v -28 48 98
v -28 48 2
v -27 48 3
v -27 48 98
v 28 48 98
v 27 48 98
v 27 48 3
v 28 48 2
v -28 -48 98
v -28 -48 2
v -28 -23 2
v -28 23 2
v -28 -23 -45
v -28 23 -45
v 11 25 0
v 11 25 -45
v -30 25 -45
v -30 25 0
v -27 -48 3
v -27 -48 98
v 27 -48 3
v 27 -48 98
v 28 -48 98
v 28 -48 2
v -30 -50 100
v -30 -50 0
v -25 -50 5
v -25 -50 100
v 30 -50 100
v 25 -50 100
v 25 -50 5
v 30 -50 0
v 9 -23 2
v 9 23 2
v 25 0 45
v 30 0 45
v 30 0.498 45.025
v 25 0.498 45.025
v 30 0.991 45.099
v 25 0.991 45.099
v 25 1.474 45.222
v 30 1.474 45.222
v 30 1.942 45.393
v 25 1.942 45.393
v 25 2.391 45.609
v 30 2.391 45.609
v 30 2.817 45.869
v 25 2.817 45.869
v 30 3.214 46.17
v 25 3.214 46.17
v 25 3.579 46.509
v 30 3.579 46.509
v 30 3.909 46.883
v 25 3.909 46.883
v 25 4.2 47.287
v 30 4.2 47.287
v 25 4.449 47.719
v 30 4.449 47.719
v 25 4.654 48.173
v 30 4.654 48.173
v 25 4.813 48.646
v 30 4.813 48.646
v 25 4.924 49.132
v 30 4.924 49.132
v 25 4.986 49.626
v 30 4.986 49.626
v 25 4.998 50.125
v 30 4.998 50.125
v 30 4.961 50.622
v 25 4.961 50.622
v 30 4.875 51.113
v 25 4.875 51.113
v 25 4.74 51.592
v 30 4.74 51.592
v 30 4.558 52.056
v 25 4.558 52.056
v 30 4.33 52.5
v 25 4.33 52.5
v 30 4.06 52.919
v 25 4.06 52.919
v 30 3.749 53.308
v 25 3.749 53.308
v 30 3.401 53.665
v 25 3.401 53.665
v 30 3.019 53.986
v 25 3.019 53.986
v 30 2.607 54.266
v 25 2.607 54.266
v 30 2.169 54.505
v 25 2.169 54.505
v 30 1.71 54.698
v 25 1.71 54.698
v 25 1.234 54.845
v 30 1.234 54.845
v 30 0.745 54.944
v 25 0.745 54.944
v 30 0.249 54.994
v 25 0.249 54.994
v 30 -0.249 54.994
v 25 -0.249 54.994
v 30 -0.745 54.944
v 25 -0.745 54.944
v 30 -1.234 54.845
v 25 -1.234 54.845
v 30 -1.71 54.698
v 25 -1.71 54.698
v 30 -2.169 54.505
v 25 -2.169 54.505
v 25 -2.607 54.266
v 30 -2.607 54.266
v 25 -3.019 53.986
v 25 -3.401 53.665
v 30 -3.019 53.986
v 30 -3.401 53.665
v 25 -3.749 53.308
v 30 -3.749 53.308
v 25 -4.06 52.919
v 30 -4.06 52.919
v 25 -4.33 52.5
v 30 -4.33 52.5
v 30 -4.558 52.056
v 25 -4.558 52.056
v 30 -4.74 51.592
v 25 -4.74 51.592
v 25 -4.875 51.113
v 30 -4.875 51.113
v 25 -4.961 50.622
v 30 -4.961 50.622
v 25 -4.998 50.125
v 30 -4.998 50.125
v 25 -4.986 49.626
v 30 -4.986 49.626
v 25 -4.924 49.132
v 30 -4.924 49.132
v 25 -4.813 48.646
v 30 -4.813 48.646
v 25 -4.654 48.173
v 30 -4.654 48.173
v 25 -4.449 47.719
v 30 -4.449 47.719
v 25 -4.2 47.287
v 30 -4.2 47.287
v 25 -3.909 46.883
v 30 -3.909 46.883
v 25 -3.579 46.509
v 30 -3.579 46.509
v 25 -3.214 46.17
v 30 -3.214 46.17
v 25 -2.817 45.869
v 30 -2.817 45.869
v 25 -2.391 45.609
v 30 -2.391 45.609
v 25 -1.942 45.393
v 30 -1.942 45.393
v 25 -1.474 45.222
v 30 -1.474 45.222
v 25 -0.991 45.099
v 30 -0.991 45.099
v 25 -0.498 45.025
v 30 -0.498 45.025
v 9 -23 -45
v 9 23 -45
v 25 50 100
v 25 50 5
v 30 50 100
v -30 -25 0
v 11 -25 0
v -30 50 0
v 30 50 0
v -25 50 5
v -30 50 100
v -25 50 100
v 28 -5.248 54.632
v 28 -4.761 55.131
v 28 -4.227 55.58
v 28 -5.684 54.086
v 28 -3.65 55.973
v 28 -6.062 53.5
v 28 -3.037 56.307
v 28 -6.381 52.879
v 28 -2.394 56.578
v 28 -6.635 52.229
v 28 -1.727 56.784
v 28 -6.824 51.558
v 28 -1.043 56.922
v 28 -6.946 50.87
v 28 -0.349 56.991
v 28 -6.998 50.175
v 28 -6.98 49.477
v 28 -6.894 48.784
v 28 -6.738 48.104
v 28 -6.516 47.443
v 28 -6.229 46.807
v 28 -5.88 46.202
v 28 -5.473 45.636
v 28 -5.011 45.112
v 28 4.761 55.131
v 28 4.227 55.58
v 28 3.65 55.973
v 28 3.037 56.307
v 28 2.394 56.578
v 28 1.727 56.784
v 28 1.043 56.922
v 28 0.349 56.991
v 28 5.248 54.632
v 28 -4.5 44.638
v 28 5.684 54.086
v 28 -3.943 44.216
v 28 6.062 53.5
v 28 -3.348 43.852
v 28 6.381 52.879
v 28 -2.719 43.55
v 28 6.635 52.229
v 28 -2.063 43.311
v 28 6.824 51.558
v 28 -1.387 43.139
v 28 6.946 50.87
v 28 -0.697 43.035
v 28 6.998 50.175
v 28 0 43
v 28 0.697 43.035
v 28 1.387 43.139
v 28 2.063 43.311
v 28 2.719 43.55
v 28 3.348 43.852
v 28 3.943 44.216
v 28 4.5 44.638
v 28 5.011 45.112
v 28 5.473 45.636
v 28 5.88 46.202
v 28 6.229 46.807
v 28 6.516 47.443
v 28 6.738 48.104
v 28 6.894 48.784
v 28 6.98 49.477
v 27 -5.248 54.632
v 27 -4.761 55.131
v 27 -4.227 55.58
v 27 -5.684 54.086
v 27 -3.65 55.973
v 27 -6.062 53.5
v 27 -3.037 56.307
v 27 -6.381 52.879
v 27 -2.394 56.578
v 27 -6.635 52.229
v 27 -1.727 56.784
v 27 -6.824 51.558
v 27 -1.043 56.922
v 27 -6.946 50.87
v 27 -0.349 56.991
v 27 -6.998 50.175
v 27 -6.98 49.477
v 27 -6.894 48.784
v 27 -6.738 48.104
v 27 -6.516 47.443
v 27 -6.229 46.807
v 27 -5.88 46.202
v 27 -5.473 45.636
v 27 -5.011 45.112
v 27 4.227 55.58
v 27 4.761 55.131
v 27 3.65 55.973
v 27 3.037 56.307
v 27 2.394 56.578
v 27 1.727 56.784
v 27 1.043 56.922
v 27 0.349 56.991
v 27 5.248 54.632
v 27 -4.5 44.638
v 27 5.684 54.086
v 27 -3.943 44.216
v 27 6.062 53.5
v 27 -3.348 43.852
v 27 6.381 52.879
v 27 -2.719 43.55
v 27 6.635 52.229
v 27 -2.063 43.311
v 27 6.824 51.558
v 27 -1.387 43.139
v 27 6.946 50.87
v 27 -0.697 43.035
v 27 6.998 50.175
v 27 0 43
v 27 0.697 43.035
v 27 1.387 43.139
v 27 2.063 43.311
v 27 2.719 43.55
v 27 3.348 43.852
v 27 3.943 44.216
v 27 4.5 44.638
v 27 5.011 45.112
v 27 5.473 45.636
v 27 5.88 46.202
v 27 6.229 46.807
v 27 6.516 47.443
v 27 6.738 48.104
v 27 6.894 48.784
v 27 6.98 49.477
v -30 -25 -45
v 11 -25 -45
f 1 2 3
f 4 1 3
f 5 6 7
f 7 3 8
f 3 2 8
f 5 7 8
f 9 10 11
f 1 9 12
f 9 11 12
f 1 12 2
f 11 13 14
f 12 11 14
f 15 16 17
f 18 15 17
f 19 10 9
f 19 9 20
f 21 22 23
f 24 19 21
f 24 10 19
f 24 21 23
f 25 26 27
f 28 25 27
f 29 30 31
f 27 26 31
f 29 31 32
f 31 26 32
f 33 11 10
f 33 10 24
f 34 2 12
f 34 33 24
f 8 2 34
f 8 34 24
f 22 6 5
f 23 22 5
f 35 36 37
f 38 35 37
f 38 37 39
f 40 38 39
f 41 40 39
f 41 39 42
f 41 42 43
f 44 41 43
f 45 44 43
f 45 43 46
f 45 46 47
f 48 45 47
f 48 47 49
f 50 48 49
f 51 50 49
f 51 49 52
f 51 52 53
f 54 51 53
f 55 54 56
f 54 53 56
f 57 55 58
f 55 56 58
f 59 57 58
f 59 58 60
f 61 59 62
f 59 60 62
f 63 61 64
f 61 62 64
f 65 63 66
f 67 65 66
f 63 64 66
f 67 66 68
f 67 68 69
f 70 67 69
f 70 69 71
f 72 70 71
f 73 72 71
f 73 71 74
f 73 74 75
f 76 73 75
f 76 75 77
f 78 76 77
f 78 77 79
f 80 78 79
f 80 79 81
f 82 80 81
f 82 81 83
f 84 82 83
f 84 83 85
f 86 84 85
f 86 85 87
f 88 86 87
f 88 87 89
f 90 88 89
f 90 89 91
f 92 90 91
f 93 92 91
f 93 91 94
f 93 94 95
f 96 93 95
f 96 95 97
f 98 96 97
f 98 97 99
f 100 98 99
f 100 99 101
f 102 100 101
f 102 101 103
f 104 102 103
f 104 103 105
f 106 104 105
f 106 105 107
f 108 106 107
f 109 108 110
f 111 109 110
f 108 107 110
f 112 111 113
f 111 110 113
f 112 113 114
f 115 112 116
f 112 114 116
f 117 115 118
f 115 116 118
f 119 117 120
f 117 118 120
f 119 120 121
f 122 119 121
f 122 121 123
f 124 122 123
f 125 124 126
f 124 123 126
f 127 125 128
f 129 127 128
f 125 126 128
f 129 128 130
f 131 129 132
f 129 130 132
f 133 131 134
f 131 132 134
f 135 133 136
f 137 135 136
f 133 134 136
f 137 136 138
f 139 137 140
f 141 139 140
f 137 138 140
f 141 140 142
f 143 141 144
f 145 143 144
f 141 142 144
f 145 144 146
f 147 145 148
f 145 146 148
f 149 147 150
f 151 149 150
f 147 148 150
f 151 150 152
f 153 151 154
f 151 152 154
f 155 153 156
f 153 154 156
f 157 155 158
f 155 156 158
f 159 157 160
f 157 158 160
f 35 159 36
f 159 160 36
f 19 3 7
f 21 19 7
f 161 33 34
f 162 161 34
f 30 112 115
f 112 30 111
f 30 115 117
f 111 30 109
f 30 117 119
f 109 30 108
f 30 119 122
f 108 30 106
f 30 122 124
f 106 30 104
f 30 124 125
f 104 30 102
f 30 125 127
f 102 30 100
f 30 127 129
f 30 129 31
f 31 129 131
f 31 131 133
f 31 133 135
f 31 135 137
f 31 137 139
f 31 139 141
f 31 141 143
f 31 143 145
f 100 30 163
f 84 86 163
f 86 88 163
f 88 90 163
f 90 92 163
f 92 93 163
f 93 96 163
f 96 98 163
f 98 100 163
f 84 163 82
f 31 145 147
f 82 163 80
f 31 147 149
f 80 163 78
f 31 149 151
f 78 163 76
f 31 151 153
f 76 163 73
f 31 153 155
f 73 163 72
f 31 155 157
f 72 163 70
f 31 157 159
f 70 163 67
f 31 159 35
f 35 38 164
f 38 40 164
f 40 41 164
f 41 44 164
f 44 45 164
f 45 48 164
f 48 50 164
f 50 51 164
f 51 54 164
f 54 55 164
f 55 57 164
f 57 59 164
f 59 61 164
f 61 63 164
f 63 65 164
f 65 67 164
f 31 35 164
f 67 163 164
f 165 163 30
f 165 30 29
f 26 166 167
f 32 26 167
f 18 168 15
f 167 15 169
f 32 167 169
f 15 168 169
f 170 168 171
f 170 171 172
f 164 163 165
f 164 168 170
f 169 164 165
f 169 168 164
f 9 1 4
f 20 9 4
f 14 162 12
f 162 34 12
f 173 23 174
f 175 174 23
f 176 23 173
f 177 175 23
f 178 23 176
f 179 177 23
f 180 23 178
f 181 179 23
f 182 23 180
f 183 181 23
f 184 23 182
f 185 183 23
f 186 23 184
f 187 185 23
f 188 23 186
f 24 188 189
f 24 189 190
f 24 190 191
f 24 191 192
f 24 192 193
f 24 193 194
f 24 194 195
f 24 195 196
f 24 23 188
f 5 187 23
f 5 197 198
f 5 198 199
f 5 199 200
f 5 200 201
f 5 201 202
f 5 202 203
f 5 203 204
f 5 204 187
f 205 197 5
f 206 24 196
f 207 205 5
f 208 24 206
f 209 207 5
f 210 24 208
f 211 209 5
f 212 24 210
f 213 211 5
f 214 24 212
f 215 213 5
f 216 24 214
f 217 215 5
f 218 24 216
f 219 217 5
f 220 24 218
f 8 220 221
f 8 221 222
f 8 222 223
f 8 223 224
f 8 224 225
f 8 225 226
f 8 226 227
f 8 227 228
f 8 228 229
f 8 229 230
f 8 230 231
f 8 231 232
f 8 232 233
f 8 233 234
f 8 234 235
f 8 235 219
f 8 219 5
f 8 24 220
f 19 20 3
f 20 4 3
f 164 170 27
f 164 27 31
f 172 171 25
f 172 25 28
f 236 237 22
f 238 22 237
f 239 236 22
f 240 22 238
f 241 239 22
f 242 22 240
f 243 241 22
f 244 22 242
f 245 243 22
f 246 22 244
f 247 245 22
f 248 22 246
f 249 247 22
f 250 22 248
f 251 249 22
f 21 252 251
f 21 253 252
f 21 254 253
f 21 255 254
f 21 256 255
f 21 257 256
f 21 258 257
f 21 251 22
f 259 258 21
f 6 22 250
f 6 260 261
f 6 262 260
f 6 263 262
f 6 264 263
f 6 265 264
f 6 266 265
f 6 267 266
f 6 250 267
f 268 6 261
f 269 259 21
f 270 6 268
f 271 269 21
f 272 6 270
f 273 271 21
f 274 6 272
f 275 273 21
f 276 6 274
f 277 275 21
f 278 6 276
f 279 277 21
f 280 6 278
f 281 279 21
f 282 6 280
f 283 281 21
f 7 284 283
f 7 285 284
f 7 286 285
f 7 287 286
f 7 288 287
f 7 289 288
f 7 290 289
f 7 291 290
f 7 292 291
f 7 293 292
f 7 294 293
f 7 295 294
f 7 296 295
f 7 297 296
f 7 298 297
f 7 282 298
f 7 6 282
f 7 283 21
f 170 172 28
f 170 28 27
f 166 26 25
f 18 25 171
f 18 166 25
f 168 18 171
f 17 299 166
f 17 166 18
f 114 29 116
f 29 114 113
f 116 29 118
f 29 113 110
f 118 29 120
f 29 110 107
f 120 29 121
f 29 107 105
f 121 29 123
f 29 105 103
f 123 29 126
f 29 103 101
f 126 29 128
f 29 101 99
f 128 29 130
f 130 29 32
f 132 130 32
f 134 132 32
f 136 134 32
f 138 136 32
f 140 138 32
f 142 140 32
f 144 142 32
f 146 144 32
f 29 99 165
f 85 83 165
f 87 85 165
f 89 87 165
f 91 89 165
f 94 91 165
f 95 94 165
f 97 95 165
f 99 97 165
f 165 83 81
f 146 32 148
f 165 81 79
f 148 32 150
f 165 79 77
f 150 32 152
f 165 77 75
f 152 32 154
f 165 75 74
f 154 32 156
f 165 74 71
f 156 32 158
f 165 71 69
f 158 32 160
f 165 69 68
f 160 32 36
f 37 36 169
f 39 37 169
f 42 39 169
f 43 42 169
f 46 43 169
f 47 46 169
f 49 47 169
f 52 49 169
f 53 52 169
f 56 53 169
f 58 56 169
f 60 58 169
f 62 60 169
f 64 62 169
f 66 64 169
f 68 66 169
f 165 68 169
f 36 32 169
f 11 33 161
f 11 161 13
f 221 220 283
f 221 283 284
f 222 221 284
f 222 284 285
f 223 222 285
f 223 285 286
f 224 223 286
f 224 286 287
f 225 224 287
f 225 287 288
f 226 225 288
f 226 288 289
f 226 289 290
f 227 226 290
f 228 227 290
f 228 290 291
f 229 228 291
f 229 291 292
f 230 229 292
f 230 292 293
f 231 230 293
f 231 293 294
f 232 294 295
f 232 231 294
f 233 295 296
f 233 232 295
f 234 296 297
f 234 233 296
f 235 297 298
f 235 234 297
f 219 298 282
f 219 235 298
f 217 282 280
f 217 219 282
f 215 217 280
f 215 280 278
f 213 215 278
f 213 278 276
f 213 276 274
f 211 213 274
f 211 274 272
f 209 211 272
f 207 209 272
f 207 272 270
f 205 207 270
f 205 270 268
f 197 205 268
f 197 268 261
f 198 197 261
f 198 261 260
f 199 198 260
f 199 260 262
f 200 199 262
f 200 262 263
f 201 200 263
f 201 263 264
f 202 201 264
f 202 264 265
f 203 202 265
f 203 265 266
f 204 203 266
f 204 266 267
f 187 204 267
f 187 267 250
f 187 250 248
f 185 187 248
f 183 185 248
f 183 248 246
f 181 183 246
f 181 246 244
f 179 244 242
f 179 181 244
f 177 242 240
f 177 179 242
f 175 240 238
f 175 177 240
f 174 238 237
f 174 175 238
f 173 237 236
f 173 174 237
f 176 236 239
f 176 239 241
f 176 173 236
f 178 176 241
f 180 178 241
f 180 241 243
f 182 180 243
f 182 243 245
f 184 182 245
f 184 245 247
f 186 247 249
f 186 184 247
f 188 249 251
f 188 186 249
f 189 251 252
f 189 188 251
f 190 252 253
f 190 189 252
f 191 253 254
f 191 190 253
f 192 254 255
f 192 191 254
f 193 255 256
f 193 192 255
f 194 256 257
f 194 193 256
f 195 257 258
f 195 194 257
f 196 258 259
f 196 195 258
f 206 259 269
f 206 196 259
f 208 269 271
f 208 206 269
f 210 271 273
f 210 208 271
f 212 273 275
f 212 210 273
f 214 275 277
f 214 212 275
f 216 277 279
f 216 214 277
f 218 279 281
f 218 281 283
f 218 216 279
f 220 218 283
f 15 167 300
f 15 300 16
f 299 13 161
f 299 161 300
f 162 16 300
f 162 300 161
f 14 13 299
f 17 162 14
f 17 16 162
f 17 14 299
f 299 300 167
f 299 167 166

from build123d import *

# Parameters (mm, degrees)
SCHIZZO1_W                   = 60
SCHIZZO1_H                   = 100
ESTRUSIONE_ESTRUSIONE1_DEPTH = 100
SCHIZZO2_W                   = 50
SCHIZZO2_H                   = 95
TAGLIO_ESTRUSIONE1_DEPTH     = 101
SCHIZZO3_R                   = 5
TAGLIO_ESTRUSIONE2_DEPTH     = 21
SCHIZZO4_W                   = 41
SCHIZZO4_H                   = 50
ESTRUSIONE_ESTRUSIONE2_DEPTH = 45
SVUOTA1_T                    = -2


with BuildPart() as part:
    # Schizzo1 → Estrusione-Estrusione1 (new body)
    with BuildSketch(Plane.XY):
        Rectangle(SCHIZZO1_W, SCHIZZO1_H)
    extrude(amount=ESTRUSIONE_ESTRUSIONE1_DEPTH)

    # Schizzo2 → Taglio-Estrusione1 (cut, through all)
    with BuildSketch(Plane(origin=(0, 50, 0), x_dir=(1, 0, 0), z_dir=(0, 1, 0))):
        with Locations((0, -52.5)):
            Rectangle(SCHIZZO2_W, SCHIZZO2_H)
    extrude(amount=-TAGLIO_ESTRUSIONE1_DEPTH, mode=Mode.SUBTRACT)

    # Schizzo3 → Taglio-Estrusione2 (cut)
    with BuildSketch(Plane(origin=(30, 0, 0), x_dir=(0, 0, -1), z_dir=(1, 0, 0))):
        with Locations((-50, 0)):
            Circle(SCHIZZO3_R)
    extrude(amount=-TAGLIO_ESTRUSIONE2_DEPTH, mode=Mode.SUBTRACT)

    # Schizzo4 → Estrusione-Estrusione2 (add)
    with BuildSketch(Plane(origin=(0, 0, 0), x_dir=(-1, 0, 0), z_dir=(0, 0, -1))):
        with Locations((9.5, 0)):
            Rectangle(SCHIZZO4_W, SCHIZZO4_H)
    extrude(amount=ESTRUSIONE_ESTRUSIONE2_DEPTH)

    # Svuota1
    svuota1_openings = [part.faces().sort_by_distance(p)[0] for p in [
        (-9.5, 0, -45),
    ]]
    offset(amount=SVUOTA1_T, openings=svuota1_openings, kind=Kind.INTERSECTION)


solid = part.part
